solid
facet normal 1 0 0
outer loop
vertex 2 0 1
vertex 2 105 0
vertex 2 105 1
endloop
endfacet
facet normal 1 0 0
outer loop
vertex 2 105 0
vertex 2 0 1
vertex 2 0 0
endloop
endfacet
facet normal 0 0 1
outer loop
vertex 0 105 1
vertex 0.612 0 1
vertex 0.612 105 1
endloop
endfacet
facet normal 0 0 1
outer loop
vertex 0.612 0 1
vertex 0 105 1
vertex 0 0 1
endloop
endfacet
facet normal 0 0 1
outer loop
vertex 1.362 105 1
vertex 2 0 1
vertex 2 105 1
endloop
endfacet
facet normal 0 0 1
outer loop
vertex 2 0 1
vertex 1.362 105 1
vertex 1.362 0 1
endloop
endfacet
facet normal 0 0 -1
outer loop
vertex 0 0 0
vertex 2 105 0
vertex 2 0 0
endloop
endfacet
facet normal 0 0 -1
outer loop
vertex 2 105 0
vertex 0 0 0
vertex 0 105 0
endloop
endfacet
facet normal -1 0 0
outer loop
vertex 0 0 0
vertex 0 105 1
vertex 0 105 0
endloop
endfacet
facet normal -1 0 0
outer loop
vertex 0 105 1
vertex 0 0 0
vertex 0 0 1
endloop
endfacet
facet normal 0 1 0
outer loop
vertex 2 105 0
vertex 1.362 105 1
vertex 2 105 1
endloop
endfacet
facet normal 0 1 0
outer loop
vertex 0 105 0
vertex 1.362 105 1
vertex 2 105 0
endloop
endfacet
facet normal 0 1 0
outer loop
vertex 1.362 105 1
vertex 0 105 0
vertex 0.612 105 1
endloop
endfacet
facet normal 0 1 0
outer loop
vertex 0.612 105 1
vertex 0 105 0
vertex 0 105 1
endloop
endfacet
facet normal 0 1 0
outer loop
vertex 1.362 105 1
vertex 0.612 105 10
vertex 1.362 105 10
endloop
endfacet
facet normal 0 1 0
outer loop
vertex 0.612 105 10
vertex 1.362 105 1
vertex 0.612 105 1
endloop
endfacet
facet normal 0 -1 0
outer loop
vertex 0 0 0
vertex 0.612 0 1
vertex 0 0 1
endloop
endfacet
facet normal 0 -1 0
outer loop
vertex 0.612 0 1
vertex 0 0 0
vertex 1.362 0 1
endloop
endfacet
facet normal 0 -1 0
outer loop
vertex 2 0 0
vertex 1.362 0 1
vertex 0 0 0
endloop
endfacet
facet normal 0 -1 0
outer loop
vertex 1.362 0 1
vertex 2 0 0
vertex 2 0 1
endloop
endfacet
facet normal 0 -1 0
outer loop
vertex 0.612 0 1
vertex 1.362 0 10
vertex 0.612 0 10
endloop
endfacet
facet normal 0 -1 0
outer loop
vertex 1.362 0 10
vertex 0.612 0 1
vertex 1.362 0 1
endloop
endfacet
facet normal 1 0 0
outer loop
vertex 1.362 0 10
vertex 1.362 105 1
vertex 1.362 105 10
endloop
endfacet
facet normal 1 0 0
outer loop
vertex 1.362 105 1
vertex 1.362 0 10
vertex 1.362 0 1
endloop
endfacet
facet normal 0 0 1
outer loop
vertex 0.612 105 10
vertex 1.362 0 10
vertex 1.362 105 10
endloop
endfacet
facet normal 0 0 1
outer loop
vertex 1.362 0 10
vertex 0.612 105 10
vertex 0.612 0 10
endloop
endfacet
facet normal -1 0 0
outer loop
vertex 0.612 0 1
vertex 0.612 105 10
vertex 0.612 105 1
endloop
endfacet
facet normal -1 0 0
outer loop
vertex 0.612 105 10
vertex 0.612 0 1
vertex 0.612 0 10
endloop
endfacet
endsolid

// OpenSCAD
union(){ 
cube([2,105,1],centre=true);
translate([0.6125,0,0])cube([0.75,105,10],centre=true);
}
